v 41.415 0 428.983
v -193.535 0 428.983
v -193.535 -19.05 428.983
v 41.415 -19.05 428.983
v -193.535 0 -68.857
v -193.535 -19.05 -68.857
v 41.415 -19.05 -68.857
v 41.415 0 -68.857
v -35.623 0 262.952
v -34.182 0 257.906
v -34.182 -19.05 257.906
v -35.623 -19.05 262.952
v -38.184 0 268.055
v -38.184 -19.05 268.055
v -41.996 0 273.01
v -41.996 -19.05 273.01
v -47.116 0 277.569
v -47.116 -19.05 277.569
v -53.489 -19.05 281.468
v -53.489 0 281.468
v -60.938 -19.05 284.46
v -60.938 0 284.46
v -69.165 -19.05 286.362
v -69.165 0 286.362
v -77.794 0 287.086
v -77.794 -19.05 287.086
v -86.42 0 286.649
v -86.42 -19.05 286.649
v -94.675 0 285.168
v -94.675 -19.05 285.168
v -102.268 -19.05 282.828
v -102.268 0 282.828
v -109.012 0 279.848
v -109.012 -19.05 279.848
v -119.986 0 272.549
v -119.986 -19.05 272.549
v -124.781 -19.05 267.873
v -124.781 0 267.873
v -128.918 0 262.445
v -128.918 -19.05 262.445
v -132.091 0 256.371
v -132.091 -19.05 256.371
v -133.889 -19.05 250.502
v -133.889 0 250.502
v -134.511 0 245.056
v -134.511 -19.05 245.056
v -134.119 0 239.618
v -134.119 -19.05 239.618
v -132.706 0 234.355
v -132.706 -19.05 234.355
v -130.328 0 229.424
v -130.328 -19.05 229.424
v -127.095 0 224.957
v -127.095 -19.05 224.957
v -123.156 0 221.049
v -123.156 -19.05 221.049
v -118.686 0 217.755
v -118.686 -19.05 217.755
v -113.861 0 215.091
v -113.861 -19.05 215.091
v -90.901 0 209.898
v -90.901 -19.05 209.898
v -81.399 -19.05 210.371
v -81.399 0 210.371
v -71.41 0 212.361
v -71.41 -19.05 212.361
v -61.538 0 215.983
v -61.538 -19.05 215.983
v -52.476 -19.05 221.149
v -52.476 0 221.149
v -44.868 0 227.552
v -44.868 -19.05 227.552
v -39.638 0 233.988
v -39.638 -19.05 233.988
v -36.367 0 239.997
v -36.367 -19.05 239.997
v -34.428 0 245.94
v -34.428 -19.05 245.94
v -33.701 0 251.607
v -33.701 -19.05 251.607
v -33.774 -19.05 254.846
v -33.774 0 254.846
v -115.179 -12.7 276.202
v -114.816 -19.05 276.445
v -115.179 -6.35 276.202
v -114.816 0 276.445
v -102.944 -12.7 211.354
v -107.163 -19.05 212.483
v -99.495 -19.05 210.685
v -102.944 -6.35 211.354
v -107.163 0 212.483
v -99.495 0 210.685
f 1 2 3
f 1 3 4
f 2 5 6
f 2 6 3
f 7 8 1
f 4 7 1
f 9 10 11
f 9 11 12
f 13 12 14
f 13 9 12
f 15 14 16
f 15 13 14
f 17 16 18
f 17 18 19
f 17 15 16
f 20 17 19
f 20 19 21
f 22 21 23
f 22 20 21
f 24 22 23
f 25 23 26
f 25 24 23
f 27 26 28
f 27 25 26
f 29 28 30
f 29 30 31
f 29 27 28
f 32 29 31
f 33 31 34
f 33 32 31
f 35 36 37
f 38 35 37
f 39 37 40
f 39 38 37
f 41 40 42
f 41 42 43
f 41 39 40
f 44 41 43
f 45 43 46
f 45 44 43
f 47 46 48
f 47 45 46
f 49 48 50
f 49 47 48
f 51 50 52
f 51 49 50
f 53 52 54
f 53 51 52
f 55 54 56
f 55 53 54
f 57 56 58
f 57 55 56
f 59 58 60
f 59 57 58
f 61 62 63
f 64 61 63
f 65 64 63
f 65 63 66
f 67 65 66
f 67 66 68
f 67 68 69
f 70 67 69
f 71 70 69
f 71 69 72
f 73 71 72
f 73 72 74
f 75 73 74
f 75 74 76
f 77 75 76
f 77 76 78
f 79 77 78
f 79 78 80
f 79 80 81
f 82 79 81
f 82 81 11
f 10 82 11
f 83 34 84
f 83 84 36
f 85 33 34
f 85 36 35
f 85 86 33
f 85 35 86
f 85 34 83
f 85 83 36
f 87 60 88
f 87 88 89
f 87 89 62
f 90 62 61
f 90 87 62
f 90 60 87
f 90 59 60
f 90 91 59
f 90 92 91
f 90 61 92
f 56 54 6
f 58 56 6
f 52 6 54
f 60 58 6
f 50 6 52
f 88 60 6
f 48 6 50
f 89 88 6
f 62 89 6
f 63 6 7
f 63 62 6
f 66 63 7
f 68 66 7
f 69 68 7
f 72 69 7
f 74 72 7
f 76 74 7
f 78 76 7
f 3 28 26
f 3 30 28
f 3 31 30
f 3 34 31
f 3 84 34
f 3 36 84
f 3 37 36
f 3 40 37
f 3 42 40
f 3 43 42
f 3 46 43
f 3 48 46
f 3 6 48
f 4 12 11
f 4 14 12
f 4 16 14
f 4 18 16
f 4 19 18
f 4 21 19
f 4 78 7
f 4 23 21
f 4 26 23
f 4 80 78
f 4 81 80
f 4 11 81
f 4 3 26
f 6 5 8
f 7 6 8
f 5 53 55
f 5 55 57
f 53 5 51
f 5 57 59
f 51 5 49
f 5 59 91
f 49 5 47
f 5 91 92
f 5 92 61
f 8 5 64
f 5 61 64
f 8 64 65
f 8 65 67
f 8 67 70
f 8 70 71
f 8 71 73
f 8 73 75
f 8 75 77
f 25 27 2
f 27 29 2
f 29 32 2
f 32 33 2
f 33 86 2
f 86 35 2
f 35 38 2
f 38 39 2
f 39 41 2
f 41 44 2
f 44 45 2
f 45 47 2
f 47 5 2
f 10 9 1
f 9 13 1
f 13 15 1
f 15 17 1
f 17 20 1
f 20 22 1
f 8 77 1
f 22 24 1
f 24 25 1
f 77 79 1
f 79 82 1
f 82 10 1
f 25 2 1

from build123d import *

# Parameters (mm, degrees)
F1_W     = 234.95
F1_H     = 497.84
F2_DEPTH = 19.05


with BuildPart() as f2:
    # F1 (on face) → F2 (new body)
    with BuildSketch(Plane.XZ):
        with Locations((-76.060367, 180.063425)):
            Rectangle(F1_W, F1_H)
        with BuildLine():
            add(Edge.make_bspline(
                [(-34.182286, 257.905787), (-46.417307, 322.752794), (-115.17867, 276.201506), (-183.940033, 229.650217), (-102.943649, 211.354499), (-21.947266, 193.058781), (-34.182286, 257.905787)],
                knots=[0, 0, 0, 2.094395, 2.094395, 4.18879, 4.18879, 6.283185, 6.283185, 6.283185], degree=2, weights=[1, 0.5, 1, 0.5, 1, 0.5, 1]))
        make_face(mode=Mode.SUBTRACT)
    extrude(amount=F2_DEPTH)


solid = f2.part
